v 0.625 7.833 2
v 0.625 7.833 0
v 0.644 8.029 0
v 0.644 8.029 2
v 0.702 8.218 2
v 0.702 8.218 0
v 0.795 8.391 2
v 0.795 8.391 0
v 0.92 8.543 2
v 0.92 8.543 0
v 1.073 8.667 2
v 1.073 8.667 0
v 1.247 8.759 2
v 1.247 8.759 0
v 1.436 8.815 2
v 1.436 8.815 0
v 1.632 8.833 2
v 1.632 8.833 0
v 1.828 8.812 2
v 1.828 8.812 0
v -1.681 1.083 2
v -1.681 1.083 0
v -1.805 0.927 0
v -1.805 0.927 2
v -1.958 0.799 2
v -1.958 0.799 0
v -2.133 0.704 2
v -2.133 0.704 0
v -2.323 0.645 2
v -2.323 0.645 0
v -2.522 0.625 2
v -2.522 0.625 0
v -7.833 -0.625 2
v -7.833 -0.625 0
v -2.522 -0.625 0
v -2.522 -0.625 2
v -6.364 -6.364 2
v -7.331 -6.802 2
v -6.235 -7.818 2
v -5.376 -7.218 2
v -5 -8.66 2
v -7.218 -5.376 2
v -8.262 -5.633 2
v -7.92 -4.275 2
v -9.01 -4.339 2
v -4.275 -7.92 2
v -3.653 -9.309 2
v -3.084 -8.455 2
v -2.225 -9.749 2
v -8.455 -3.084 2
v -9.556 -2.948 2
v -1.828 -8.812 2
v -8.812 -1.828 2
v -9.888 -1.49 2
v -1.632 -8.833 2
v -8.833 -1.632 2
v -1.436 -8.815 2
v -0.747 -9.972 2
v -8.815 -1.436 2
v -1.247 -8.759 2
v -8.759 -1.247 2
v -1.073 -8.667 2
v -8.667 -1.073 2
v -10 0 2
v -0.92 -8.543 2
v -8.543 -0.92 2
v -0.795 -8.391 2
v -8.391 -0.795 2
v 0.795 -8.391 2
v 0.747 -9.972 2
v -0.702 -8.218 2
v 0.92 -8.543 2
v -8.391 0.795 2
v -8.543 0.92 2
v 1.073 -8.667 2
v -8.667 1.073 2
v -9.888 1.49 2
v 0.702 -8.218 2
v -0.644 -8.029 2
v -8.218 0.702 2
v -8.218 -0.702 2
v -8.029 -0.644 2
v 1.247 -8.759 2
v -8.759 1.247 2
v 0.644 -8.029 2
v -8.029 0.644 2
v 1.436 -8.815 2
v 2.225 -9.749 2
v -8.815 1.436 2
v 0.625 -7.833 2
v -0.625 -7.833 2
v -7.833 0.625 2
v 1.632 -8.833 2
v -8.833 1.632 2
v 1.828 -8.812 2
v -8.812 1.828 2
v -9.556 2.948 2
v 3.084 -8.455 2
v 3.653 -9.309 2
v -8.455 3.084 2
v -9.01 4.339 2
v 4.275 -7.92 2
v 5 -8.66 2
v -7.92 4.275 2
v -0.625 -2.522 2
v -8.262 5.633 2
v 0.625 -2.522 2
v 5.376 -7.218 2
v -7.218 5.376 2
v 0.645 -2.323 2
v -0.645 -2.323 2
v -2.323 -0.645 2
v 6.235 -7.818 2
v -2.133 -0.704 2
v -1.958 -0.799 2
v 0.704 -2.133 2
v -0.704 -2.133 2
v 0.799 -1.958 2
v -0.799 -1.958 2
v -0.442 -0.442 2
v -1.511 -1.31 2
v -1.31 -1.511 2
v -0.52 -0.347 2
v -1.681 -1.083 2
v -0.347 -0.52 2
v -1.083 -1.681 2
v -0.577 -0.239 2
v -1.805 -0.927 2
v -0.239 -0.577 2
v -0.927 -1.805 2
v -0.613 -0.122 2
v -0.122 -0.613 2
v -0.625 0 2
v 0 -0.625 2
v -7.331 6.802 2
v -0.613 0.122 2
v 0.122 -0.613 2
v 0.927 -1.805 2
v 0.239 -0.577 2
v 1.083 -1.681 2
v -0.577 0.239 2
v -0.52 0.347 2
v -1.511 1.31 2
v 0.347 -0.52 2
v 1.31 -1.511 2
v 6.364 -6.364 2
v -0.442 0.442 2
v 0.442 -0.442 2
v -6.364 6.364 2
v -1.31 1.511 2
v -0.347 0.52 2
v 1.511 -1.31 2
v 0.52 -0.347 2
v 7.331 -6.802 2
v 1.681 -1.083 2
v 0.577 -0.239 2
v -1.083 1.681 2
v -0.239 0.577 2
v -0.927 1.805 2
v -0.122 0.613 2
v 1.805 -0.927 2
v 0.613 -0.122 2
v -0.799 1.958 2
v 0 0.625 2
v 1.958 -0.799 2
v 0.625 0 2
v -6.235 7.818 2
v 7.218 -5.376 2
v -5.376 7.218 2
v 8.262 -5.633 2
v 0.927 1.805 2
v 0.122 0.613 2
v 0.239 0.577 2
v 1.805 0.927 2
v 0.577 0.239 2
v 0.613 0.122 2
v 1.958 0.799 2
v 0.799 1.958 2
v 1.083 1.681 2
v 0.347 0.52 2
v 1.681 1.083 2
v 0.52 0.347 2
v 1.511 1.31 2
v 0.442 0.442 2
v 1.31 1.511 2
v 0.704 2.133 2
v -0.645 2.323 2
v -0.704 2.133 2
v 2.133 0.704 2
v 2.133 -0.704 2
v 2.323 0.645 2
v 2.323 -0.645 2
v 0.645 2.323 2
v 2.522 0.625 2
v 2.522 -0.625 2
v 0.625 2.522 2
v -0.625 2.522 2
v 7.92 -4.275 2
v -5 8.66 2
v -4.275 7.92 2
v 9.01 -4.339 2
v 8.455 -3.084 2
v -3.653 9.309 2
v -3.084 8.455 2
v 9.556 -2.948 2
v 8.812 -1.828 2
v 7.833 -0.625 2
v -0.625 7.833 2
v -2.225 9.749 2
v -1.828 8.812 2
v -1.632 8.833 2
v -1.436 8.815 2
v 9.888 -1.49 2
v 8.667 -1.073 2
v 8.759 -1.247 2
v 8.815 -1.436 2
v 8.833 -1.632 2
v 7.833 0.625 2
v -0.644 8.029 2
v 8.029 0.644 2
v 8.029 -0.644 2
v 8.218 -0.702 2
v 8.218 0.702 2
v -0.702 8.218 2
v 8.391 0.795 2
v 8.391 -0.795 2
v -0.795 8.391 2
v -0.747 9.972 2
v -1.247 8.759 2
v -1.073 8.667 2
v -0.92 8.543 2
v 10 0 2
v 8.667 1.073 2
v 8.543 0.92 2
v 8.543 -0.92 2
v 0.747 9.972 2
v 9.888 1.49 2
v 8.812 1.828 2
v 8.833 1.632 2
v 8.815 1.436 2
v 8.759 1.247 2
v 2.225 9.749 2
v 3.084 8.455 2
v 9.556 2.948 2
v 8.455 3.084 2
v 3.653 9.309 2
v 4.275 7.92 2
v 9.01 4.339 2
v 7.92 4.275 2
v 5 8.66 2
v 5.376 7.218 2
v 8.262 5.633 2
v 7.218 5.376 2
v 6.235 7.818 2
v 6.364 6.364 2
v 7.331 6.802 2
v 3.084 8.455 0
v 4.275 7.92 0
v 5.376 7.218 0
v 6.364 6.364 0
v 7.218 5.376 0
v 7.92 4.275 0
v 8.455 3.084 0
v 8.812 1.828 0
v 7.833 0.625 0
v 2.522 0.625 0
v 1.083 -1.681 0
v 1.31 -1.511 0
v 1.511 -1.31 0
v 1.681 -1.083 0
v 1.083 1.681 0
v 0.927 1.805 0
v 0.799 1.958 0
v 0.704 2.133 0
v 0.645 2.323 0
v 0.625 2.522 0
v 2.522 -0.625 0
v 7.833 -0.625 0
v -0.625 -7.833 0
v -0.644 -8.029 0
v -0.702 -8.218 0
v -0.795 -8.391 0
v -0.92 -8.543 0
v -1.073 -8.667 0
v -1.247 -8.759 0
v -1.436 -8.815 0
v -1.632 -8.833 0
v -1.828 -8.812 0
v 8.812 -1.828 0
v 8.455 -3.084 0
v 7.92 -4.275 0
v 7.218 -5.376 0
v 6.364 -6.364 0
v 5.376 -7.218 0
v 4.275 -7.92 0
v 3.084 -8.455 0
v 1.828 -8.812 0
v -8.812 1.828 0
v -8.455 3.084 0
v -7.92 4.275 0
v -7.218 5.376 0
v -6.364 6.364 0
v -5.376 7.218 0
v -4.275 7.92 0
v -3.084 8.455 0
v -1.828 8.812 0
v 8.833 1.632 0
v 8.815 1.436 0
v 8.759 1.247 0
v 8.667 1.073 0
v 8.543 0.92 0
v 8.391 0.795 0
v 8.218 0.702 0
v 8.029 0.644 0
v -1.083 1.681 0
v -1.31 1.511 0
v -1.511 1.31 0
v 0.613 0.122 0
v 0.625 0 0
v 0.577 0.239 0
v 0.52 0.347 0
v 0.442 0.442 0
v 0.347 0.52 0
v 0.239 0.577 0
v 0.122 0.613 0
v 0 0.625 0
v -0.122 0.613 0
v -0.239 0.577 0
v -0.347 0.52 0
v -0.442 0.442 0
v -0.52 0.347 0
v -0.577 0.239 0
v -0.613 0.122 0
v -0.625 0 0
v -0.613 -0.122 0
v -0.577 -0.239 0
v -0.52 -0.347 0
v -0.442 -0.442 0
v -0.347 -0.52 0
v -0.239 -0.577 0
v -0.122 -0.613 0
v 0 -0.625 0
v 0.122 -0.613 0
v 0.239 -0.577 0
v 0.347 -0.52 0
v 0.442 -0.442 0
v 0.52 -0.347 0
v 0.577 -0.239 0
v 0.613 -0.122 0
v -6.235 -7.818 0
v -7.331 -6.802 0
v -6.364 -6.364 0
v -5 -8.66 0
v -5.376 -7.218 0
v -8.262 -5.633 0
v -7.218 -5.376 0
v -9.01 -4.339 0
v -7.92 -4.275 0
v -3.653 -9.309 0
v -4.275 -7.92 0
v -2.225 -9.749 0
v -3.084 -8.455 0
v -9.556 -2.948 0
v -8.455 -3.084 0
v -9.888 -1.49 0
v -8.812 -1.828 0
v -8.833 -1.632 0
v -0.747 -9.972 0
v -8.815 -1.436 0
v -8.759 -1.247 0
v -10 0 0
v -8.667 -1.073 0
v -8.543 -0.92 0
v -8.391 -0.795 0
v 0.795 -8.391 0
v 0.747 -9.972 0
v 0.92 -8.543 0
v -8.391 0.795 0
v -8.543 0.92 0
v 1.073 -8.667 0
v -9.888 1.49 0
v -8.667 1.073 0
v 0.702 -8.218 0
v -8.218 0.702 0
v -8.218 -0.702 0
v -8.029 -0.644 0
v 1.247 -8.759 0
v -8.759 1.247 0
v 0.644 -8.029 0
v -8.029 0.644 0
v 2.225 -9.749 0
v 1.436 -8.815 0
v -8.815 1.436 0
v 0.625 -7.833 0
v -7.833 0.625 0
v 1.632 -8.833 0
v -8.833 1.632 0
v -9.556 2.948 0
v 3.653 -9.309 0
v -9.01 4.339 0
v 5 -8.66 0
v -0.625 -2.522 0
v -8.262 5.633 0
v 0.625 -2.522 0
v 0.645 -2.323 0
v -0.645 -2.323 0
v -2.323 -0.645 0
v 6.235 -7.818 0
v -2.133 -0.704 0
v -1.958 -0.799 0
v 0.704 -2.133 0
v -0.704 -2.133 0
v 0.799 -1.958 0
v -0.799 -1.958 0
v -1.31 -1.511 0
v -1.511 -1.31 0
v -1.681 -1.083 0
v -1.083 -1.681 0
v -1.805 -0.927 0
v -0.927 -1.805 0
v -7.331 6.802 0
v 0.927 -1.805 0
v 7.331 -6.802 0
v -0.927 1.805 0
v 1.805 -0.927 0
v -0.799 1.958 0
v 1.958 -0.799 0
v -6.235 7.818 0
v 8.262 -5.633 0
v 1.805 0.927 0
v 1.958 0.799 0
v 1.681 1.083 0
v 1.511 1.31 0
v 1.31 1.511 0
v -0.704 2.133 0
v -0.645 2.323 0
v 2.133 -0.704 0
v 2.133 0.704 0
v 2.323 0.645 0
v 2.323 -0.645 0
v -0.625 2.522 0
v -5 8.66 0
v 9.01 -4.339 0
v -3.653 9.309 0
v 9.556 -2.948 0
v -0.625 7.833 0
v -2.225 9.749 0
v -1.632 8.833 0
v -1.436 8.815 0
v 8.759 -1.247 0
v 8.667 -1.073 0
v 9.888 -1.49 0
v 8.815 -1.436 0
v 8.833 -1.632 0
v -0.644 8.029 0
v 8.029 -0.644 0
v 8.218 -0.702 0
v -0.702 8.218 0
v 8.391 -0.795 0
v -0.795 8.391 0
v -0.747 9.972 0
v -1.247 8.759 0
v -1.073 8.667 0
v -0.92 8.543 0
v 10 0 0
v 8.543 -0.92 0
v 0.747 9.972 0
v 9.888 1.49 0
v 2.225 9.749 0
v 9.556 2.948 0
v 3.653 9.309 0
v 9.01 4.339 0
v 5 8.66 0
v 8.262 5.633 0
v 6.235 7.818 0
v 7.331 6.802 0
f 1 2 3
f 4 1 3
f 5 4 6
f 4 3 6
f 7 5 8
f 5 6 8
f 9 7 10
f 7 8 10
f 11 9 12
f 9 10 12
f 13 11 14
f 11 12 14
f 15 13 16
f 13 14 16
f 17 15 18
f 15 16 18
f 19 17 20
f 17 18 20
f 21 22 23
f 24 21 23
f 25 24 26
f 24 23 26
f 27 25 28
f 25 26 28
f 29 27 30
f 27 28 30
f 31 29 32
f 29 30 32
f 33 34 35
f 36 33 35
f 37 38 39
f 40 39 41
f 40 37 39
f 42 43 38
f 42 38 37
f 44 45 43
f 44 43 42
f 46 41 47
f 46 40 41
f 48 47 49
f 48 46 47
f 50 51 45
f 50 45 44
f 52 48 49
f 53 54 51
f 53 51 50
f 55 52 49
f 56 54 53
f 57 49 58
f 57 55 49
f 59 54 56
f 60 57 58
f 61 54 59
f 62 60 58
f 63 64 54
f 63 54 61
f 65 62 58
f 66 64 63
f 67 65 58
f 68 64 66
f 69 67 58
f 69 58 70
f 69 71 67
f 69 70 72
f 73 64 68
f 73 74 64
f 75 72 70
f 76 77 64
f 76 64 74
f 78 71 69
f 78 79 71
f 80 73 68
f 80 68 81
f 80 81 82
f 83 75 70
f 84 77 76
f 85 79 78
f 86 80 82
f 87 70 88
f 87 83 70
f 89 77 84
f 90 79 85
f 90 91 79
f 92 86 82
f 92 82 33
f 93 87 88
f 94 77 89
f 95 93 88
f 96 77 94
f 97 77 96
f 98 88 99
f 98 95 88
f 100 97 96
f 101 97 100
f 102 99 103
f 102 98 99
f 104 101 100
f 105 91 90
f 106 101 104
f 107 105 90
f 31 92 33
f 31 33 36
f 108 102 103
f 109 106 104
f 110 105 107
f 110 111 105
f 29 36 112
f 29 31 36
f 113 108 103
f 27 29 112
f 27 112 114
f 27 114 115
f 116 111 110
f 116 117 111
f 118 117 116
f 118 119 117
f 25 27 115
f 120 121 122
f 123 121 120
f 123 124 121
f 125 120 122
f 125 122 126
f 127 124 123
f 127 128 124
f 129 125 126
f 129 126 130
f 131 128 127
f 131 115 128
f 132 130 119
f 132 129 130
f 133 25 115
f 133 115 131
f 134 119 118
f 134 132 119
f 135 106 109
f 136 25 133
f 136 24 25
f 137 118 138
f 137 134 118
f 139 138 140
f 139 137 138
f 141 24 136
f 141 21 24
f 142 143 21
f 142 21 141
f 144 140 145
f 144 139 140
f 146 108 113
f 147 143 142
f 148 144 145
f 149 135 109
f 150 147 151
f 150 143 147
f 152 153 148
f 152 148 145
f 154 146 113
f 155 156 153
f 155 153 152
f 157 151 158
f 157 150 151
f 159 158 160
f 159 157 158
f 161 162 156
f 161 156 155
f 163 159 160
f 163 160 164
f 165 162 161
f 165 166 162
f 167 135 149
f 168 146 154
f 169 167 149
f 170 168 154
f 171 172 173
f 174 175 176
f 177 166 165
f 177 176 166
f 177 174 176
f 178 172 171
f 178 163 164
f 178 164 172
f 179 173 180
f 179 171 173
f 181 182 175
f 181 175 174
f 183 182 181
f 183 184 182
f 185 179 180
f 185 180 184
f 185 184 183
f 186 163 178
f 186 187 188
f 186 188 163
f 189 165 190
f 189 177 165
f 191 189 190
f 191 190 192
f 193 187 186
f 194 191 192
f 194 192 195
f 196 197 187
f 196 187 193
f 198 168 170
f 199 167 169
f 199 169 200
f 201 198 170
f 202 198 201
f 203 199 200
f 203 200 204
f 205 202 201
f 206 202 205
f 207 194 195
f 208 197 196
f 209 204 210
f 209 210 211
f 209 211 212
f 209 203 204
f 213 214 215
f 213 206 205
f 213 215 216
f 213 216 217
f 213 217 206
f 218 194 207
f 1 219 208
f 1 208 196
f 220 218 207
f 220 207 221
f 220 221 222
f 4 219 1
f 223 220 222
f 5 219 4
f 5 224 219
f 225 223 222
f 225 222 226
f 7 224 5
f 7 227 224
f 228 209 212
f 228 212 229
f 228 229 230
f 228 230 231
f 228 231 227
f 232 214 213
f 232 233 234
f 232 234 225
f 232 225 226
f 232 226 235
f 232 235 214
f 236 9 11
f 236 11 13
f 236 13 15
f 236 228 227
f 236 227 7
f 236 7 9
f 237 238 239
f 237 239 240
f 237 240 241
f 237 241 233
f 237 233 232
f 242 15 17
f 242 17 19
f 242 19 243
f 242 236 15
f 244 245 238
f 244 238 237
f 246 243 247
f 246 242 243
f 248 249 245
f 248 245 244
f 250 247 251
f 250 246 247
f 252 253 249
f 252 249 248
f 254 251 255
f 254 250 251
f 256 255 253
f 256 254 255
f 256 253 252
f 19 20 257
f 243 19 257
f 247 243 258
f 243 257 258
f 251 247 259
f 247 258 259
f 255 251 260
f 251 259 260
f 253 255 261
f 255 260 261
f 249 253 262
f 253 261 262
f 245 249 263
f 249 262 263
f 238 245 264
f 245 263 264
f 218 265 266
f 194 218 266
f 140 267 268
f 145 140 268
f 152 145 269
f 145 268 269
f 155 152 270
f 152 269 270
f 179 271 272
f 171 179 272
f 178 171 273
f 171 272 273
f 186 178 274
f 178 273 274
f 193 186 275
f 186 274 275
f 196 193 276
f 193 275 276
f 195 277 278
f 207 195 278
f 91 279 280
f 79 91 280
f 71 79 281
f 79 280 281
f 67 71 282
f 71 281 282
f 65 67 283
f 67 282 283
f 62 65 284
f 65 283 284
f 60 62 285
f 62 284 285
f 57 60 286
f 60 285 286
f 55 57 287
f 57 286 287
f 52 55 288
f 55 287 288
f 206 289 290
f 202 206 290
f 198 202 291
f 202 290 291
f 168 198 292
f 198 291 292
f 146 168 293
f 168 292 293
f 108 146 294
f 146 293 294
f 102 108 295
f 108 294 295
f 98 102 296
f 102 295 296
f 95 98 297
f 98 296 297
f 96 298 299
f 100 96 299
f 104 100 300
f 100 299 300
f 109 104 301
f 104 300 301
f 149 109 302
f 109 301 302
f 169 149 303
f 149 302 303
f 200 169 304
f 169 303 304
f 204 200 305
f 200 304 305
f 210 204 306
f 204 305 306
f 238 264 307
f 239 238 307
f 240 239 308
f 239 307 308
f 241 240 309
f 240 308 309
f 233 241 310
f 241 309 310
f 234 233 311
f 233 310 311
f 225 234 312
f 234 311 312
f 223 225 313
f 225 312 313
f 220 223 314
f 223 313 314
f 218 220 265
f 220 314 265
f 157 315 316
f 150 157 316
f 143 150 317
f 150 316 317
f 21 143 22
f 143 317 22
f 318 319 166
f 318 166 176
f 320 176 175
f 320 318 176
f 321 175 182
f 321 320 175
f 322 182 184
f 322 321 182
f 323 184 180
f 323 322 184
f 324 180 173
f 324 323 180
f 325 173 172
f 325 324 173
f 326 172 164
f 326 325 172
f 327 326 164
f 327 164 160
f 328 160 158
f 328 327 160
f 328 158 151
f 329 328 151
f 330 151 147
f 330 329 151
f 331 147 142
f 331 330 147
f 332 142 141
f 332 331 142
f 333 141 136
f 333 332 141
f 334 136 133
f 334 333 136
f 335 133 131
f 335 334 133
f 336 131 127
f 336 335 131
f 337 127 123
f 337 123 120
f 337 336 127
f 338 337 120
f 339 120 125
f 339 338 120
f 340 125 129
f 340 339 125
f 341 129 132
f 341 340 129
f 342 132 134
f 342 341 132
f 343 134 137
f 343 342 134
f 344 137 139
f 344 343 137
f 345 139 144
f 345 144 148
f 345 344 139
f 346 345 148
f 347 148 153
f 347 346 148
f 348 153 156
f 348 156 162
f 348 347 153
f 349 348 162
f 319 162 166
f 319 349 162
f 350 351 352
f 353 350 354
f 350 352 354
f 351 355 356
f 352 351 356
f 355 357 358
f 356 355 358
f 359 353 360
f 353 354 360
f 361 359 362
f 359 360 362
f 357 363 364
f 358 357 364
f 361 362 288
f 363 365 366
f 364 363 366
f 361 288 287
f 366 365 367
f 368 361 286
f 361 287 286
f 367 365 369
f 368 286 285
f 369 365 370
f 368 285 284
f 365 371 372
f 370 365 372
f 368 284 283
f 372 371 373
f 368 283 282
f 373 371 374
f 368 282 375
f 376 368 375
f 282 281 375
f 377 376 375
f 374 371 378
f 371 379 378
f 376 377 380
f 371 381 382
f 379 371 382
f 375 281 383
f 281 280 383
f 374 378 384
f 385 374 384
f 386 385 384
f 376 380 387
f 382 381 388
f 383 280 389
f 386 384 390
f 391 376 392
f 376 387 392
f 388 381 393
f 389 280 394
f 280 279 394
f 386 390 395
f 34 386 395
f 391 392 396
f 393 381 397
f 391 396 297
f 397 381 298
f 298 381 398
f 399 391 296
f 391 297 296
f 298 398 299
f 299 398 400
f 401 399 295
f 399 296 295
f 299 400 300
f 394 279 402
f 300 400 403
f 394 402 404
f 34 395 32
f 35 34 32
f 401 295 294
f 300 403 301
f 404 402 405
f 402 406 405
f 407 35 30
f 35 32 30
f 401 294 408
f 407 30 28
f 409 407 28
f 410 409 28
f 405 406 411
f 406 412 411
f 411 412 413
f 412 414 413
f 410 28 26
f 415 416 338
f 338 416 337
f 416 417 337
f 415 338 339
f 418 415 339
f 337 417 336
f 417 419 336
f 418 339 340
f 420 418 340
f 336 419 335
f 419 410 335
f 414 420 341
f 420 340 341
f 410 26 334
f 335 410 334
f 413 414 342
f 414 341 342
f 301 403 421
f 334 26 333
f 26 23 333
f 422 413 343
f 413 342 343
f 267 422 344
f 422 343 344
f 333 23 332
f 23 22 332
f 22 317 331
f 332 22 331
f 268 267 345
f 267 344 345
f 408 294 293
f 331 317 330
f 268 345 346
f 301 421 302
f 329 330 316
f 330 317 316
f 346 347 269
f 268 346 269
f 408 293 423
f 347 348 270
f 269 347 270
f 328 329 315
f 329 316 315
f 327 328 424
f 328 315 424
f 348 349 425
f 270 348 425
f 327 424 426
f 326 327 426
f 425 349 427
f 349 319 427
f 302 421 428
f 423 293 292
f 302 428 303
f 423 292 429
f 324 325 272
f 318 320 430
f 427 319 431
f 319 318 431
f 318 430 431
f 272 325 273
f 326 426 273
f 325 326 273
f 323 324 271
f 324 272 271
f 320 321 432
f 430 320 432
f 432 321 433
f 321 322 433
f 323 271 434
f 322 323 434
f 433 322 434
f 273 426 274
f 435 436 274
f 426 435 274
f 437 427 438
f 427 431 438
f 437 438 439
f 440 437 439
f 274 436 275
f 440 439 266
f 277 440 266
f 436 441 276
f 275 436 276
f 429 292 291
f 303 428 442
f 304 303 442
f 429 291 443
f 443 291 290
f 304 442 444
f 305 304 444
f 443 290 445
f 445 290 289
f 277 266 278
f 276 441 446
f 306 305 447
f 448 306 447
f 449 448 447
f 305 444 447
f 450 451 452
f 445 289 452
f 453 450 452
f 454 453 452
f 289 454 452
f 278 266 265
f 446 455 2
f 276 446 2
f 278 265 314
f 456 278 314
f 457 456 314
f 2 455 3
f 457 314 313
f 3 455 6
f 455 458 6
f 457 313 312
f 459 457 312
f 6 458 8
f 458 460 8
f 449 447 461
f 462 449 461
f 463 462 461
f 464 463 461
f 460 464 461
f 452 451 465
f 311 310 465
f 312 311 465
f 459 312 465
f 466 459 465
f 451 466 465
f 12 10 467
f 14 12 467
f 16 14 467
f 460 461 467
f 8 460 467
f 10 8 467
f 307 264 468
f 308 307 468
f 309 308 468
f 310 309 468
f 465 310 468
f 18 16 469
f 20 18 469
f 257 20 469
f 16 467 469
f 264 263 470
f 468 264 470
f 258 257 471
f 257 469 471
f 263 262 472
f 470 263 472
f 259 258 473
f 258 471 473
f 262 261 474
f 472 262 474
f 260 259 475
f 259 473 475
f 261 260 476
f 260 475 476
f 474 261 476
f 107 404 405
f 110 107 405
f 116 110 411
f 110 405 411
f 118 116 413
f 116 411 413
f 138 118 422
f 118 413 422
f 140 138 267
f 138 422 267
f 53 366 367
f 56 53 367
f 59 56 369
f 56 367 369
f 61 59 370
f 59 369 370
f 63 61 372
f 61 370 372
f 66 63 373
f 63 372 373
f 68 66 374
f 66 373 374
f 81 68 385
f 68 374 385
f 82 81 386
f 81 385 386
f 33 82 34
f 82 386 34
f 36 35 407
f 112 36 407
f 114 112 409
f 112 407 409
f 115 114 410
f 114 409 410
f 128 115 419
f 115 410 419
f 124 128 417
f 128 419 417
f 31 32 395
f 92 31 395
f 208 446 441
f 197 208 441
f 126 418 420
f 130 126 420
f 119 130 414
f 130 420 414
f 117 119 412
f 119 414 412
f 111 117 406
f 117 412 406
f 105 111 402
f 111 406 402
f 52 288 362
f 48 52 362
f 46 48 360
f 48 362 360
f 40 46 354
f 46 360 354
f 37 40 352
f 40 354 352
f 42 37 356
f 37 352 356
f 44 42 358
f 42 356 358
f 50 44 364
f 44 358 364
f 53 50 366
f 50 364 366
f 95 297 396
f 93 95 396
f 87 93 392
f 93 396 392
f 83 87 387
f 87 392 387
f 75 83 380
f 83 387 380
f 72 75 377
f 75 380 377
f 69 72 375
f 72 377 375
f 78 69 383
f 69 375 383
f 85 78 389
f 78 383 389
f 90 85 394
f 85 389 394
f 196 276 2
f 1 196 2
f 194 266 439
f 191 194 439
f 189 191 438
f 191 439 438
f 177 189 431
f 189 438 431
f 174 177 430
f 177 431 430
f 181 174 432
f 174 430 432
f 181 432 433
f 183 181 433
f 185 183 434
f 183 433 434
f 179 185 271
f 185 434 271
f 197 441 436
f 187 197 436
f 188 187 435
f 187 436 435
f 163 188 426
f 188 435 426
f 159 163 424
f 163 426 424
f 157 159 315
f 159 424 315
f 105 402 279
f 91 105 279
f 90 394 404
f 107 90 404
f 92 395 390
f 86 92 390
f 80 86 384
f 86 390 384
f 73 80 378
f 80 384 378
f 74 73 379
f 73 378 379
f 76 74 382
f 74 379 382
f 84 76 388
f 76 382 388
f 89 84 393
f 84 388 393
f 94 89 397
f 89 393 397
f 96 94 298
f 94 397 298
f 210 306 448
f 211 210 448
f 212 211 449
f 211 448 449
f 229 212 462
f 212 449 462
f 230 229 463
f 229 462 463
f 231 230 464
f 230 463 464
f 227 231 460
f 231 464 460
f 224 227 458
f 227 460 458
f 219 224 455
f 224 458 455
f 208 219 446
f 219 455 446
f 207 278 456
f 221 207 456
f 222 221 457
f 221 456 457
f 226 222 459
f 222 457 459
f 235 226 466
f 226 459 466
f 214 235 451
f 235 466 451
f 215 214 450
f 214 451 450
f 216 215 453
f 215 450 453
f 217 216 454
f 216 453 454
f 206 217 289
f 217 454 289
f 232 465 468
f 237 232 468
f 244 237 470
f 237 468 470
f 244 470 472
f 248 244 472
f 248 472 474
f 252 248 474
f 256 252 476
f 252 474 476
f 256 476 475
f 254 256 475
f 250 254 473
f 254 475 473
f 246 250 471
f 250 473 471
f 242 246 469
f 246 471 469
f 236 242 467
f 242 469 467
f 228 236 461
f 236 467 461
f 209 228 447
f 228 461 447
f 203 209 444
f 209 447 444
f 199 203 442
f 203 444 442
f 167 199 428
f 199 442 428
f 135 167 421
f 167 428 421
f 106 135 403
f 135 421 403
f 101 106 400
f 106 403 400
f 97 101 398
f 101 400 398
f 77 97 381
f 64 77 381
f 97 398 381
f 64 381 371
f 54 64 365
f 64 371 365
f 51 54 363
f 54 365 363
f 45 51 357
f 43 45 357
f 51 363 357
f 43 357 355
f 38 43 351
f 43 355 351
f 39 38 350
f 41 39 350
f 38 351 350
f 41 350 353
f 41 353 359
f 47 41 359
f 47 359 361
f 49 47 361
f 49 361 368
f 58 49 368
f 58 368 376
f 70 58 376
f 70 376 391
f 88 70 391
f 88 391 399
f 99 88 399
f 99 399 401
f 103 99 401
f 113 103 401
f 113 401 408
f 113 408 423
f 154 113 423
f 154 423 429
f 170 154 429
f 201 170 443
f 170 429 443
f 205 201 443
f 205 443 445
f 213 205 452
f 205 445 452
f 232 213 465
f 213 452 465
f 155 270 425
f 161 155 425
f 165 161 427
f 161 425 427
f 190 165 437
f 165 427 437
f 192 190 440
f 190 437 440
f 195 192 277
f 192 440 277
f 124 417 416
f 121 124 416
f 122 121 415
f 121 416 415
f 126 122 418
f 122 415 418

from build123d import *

# Parameters (mm, degrees)
F0_R     = 10
F0_R_2   = 0.625
F1_DEPTH = 2


with BuildPart() as f1:
    # F0 (on Top) → F1 (new body)
    with BuildSketch(Plane.XY):
        Circle(F0_R)
        with BuildLine():
            Line((-0.625, -2.52178), (-0.625, -7.833223))
            ThreePointArc((-0.625, -7.833223), (-0.993781, -8.608827), (-1.828125, -8.812375))
            ThreePointArc((-1.828125, -8.812375), (-6.363961, -6.363961), (-8.812375, -1.828125))
            ThreePointArc((-8.812375, -1.828125), (-8.608827, -0.993781), (-7.833223, -0.625))
            Line((-7.833223, -0.625), (-2.52178, -0.625))
            ThreePointArc((-2.52178, -0.625), (-2.043067, -0.747029), (-1.681187, -1.083333))
            ThreePointArc((-1.681187, -1.083333), (-1.414214, -1.414214), (-1.083333, -1.681187))
            ThreePointArc((-1.083333, -1.681187), (-0.747029, -2.043067), (-0.625, -2.52178))
        make_face(mode=Mode.SUBTRACT)
        with BuildLine():
            Line((2.52178, -0.625), (7.833223, -0.625))
            ThreePointArc((7.833223, -0.625), (8.608827, -0.993781), (8.812375, -1.828125))
            ThreePointArc((8.812375, -1.828125), (6.363961, -6.363961), (1.828125, -8.812375))
            ThreePointArc((1.828125, -8.812375), (0.993781, -8.608827), (0.625, -7.833223))
            Line((0.625, -7.833223), (0.625, -2.52178))
            ThreePointArc((0.625, -2.52178), (0.747029, -2.043067), (1.083333, -1.681187))
            ThreePointArc((1.083333, -1.681187), (1.414214, -1.414214), (1.681187, -1.083333))
            ThreePointArc((1.681187, -1.083333), (2.043067, -0.747029), (2.52178, -0.625))
        make_face(mode=Mode.SUBTRACT)
        with BuildLine():
            ThreePointArc((-0.625, 2.52178), (-0.747029, 2.043067), (-1.083333, 1.681187))
            ThreePointArc((-1.083333, 1.681187), (-1.414214, 1.414214), (-1.681187, 1.083333))
            ThreePointArc((-1.681187, 1.083333), (-2.043067, 0.747029), (-2.52178, 0.625))
            Line((-2.52178, 0.625), (-7.833223, 0.625))
            ThreePointArc((-7.833223, 0.625), (-8.608827, 0.993781), (-8.812375, 1.828125))
            ThreePointArc((-8.812375, 1.828125), (-6.363961, 6.363961), (-1.828125, 8.812375))
            ThreePointArc((-1.828125, 8.812375), (-0.993781, 8.608827), (-0.625, 7.833223))
            Line((-0.625, 7.833223), (-0.625, 2.52178))
        make_face(mode=Mode.SUBTRACT)
        Circle(F0_R_2, mode=Mode.SUBTRACT)
        with BuildLine():
            ThreePointArc((1.828125, 8.812375), (6.363961, 6.363961), (8.812375, 1.828125))
            ThreePointArc((8.812375, 1.828125), (8.608827, 0.993781), (7.833223, 0.625))
            Line((7.833223, 0.625), (2.52178, 0.625))
            ThreePointArc((2.52178, 0.625), (2.043067, 0.747029), (1.681187, 1.083333))
            ThreePointArc((1.681187, 1.083333), (1.414214, 1.414214), (1.083333, 1.681187))
            ThreePointArc((1.083333, 1.681187), (0.747029, 2.043067), (0.625, 2.52178))
            Line((0.625, 2.52178), (0.625, 7.833223))
            ThreePointArc((0.625, 7.833223), (0.993781, 8.608827), (1.828125, 8.812375))
        make_face(mode=Mode.SUBTRACT)
    extrude(amount=F1_DEPTH)


solid = f1.part
